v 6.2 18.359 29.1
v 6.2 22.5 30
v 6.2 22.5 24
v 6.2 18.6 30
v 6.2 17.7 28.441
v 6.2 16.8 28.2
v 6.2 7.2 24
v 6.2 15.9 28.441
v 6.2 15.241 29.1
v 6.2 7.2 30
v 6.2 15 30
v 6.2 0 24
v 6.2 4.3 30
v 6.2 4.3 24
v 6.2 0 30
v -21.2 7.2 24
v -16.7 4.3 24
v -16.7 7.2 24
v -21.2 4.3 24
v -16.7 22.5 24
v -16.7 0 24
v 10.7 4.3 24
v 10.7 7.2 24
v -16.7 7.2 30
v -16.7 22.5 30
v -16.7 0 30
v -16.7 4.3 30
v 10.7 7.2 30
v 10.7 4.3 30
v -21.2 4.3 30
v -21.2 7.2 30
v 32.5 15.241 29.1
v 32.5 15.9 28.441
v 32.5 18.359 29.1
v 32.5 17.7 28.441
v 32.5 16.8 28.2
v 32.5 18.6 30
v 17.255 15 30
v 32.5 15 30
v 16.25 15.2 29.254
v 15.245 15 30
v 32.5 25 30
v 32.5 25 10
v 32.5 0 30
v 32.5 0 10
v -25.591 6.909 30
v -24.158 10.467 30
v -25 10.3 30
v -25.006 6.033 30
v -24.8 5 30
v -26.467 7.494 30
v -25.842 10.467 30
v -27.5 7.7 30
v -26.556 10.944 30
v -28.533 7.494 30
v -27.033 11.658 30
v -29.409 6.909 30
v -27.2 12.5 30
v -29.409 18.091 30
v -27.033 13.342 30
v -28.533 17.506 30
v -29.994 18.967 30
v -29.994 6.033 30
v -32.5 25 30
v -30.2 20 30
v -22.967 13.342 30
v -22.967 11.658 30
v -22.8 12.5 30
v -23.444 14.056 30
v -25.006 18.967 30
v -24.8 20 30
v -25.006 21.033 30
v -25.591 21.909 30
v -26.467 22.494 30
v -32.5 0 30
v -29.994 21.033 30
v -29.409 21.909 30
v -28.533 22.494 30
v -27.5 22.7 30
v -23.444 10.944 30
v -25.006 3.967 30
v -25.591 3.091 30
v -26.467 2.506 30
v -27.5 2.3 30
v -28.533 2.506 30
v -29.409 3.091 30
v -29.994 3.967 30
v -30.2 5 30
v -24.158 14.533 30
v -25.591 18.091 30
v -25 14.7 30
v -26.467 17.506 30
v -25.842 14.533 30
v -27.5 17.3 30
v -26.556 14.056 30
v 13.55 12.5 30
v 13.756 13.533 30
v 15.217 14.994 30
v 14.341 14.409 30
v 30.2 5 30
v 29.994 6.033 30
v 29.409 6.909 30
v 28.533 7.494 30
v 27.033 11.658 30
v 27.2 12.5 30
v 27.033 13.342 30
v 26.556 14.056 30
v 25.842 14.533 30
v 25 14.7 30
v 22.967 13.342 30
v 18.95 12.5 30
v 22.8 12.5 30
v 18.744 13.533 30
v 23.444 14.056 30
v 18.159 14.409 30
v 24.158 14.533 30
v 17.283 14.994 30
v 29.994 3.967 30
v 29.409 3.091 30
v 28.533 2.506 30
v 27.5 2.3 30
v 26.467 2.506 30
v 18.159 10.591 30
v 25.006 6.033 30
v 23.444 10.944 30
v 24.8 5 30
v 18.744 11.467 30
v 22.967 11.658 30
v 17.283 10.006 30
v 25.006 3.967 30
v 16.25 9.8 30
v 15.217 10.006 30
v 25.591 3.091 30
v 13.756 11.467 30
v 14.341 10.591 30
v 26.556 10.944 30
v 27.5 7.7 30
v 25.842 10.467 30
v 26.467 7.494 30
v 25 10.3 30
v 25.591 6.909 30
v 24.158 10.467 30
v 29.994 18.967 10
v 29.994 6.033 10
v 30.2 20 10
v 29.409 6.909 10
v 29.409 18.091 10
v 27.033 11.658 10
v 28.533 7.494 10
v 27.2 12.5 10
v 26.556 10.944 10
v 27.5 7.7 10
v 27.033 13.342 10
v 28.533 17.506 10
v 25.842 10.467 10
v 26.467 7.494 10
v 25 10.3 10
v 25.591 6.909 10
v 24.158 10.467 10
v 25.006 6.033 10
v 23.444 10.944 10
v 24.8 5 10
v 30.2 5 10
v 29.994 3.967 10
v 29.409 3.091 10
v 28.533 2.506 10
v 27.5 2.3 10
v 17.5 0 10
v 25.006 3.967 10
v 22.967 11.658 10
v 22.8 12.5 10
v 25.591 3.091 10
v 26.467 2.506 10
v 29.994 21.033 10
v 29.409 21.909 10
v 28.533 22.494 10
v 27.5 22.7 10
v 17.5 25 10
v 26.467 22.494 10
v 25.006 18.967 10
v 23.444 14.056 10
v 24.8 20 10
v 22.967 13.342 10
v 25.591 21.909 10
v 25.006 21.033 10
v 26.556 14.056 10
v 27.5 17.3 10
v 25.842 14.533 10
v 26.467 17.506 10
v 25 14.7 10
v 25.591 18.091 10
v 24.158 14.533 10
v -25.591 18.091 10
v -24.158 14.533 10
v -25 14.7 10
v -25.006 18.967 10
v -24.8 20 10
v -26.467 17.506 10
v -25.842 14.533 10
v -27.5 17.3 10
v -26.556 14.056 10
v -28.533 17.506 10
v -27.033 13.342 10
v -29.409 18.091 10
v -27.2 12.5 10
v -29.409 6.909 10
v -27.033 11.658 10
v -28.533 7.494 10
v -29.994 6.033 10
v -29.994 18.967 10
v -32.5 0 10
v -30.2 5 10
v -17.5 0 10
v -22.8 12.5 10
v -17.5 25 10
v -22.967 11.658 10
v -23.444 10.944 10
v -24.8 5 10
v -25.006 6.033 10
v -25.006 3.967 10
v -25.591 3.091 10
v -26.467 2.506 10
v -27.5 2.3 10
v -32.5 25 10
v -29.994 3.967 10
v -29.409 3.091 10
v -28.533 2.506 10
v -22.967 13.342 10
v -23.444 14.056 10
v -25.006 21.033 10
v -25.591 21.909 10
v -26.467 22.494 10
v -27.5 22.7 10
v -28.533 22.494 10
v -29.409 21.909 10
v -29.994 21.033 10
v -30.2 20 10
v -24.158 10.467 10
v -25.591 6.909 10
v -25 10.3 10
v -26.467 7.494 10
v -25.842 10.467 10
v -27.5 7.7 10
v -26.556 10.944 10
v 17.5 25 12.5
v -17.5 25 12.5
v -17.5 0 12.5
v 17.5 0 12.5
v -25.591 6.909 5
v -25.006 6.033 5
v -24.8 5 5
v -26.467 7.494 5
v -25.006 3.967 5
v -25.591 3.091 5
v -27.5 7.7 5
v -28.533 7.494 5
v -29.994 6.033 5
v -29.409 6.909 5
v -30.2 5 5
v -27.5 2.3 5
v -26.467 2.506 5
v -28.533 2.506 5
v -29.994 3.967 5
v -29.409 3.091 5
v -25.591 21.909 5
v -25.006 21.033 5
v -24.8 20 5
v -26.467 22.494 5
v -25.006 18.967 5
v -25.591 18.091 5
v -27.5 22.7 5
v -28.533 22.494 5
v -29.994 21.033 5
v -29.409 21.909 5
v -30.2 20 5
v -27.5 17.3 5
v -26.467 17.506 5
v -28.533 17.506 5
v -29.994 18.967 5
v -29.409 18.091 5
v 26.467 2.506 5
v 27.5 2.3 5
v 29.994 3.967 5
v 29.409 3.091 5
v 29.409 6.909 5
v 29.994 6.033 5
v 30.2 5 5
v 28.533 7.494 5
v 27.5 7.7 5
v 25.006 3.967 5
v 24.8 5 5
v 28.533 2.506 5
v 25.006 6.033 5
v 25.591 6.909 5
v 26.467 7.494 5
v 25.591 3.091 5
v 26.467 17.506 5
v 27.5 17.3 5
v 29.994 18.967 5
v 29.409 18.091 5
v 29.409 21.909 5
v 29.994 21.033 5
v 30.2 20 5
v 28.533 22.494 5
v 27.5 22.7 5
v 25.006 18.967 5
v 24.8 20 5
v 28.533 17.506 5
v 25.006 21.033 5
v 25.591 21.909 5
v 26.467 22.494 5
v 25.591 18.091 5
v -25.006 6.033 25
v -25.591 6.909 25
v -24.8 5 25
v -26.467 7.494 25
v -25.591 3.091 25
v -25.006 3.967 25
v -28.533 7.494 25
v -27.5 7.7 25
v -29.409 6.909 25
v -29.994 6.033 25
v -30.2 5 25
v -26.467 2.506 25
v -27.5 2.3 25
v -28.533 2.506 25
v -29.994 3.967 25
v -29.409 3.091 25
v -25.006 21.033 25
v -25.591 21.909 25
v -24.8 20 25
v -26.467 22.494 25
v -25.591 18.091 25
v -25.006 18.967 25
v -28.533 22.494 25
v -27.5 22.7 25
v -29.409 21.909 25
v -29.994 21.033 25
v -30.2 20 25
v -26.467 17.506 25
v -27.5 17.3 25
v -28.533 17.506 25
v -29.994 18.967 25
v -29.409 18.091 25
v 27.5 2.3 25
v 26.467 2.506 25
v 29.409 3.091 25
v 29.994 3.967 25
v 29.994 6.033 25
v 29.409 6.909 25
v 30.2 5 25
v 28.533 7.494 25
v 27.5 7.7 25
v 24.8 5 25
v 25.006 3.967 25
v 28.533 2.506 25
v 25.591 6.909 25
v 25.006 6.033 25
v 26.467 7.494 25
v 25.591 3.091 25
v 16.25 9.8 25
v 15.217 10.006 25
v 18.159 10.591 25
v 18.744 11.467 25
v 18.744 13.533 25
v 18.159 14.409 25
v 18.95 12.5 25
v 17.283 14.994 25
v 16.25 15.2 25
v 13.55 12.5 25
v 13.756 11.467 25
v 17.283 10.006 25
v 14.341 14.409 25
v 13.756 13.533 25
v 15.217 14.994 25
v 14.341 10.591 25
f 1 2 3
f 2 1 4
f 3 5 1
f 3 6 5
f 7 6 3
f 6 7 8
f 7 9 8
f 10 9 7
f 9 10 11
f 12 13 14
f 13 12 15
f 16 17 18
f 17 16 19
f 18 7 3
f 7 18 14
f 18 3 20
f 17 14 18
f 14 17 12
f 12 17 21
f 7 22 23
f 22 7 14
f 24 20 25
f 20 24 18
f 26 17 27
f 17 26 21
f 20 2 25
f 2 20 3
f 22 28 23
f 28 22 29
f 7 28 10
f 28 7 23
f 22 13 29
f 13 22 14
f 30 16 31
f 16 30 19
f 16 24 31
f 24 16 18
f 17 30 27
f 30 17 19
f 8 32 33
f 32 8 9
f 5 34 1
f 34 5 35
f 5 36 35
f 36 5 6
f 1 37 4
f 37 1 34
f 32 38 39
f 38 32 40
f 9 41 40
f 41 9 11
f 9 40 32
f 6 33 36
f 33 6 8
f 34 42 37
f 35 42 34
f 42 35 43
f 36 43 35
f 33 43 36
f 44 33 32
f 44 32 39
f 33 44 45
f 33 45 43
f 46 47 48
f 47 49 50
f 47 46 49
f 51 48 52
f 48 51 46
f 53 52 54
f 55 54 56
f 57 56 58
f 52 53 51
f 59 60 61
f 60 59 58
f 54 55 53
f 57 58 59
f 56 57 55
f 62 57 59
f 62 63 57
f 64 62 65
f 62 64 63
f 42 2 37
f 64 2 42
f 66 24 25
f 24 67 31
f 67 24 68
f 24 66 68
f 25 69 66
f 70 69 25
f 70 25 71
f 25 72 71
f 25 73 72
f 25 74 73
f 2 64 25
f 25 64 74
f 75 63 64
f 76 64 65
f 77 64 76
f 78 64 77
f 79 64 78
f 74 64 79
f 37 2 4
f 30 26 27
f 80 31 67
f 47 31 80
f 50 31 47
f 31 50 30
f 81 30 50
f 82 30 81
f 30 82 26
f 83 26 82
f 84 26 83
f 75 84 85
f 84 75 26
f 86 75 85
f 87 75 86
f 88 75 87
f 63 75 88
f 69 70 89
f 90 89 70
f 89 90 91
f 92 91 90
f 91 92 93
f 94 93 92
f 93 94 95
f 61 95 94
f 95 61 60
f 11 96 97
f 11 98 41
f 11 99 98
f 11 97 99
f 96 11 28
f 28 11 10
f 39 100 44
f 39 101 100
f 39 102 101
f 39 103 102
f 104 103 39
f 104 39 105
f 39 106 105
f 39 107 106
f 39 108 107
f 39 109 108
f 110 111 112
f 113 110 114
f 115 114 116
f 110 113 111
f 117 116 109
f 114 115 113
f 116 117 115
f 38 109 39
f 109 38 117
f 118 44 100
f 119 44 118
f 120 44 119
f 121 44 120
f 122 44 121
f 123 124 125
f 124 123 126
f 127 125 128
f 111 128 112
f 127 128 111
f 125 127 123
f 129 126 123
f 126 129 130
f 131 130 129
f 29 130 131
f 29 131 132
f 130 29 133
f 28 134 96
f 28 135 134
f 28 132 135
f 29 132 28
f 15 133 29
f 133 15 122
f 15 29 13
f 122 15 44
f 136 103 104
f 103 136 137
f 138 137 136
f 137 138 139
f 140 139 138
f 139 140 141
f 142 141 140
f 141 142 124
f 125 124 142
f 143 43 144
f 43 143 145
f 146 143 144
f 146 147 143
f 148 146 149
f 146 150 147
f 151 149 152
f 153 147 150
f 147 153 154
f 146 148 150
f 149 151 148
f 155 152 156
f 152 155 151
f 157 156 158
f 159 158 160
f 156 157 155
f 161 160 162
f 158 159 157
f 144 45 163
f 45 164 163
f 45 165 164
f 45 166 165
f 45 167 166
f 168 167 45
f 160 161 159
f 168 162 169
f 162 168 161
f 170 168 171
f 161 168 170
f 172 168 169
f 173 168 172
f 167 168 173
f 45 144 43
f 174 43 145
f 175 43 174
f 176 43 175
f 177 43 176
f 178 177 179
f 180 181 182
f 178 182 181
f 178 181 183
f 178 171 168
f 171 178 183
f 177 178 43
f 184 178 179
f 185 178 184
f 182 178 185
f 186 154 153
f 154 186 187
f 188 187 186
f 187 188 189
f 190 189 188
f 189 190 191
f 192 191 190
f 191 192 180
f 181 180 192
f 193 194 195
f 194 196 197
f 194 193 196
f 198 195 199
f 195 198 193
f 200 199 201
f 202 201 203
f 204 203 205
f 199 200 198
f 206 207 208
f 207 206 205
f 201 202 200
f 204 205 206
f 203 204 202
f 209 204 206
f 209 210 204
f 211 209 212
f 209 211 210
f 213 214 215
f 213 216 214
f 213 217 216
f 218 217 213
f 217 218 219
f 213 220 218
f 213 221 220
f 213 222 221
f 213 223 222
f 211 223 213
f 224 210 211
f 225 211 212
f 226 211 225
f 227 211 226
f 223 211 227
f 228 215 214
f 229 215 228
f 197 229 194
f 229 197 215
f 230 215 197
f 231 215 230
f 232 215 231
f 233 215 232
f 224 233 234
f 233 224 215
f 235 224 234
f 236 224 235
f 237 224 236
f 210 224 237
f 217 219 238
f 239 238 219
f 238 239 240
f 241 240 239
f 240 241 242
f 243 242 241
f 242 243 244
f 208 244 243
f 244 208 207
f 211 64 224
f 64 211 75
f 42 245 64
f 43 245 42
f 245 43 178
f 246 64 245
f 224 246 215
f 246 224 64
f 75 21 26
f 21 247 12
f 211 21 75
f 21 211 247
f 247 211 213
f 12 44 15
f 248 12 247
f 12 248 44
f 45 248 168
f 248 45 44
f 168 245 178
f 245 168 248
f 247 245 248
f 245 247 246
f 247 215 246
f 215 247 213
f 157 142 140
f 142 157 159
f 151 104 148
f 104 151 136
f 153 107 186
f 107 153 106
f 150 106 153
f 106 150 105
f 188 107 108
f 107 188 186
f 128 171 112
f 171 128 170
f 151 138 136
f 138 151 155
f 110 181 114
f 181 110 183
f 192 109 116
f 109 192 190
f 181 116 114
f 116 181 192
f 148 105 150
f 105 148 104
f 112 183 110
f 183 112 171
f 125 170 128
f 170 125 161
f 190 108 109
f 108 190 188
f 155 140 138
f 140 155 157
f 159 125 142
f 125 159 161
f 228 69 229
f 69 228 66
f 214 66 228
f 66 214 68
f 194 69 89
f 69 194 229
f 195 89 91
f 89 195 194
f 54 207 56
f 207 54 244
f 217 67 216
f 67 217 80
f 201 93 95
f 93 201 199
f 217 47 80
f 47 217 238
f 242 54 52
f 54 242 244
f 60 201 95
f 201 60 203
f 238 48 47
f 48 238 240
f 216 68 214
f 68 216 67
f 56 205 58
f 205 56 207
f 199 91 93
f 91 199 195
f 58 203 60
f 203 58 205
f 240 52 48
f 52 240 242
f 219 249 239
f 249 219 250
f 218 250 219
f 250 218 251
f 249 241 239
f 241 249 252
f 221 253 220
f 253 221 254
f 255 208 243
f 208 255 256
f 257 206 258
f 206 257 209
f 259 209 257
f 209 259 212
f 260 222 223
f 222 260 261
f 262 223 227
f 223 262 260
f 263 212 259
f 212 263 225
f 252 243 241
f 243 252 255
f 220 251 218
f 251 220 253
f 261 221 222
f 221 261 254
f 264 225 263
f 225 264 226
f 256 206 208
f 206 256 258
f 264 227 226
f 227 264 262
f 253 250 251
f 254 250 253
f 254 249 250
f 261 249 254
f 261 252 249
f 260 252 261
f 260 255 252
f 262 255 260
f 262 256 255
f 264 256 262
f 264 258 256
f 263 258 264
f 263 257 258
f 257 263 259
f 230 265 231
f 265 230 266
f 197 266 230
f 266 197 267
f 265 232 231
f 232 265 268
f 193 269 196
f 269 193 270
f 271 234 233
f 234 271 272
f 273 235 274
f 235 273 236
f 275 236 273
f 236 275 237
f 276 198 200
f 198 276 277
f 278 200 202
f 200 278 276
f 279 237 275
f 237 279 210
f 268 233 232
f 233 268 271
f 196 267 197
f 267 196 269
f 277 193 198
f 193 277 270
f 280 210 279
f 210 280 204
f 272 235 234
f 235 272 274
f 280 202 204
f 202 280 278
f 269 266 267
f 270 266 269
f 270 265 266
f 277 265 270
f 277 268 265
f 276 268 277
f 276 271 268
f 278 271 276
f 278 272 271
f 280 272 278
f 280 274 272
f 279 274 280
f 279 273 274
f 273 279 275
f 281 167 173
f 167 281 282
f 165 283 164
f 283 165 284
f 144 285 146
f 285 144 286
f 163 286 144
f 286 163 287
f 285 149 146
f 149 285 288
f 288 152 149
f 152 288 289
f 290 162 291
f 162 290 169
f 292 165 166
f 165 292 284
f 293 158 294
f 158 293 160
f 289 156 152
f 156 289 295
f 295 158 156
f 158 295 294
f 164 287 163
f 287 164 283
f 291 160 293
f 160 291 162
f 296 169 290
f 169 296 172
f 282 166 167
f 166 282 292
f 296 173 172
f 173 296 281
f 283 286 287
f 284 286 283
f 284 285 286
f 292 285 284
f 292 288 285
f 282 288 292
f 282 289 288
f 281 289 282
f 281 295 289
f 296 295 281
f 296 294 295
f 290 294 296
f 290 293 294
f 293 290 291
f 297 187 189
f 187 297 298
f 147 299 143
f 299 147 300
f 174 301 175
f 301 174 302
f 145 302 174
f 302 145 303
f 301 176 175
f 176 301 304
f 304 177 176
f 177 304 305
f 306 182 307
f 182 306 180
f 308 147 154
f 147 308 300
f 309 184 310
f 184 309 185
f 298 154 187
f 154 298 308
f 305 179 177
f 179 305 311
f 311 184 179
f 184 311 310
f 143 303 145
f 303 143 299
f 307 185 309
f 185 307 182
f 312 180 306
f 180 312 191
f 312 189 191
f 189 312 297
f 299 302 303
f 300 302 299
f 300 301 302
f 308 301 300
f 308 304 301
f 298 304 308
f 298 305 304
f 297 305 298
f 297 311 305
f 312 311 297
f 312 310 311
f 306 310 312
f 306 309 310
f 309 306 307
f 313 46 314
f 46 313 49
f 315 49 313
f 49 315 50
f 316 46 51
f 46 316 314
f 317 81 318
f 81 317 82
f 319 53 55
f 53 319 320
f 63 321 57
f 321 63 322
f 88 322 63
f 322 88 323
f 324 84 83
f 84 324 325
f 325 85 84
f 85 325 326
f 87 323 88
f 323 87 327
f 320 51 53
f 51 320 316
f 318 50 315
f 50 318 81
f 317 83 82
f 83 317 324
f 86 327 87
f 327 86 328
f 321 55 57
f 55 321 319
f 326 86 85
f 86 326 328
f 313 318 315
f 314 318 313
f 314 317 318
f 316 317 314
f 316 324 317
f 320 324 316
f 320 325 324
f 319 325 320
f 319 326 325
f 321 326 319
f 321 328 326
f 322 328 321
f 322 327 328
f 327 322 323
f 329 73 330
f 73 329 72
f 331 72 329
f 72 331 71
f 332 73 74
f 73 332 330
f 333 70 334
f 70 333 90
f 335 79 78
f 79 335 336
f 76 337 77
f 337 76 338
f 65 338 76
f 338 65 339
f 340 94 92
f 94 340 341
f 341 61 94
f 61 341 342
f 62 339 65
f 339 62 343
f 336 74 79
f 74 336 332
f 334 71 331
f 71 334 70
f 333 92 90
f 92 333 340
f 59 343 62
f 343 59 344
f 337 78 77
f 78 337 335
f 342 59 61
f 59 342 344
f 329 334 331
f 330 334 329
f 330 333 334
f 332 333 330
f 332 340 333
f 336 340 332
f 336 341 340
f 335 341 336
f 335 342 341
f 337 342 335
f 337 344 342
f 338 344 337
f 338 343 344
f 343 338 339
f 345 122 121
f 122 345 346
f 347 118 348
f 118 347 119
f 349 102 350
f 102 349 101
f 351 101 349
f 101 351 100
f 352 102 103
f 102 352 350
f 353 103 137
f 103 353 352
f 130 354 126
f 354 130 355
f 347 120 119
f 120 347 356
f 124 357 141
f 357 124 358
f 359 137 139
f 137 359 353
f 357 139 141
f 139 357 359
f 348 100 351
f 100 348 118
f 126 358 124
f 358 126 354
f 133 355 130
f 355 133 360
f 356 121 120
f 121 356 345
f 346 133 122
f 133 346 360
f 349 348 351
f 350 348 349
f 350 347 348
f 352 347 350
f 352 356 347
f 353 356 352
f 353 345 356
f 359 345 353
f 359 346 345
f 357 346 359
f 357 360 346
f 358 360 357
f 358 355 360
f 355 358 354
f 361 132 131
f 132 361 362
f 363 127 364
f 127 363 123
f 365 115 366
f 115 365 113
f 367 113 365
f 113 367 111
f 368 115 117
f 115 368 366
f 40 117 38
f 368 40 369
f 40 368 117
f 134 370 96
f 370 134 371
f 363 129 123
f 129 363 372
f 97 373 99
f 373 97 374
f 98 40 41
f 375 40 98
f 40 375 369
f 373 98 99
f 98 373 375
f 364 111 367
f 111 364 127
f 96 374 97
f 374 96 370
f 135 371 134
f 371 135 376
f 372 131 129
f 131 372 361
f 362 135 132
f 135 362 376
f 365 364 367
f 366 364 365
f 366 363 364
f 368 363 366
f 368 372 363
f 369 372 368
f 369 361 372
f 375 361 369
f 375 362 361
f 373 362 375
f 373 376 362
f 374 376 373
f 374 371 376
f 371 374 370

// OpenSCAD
// file: servo.scad
    box_width=22.5;
    box_depth=23.3;
    box_height=12;
    cylinder_depth=6;
    small_cylinder=3;
    cylinders_width=15;
    gear_radius=2.5;
    gear_height=3;
    fixation_depth=2.5;
    fixation_width=4.5;
    fixation_depth_position=5.5;
    vis_hole=1;
    screw_radius=0.5;
    screw_long=10;
    cable_radius=1.6;
    cable_depth=5.5;


    wheel_depth=8;
    wheel_height=6;
    wheel_radius=30;
    wheel_depth_int=4;
    wheel_gear=2;


function wheelRadius() = wheel_radius;


module servo(with_screw=false,with_cable=false,with_screw_hole=true,security=0) {        
    //big cylinder
    translate([box_width-box_height/2,0,box_height/2]){
        rotate([90,0,0]){
            #cylinder(cylinder_depth,d=box_height+2*security);
        }
    }
    //gear
    translate([box_width-box_height/2,-cylinder_depth,box_height/2]){
        rotate([90,0,0]){
            cylinder(gear_height,gear_radius,gear_radius);
        }
    }
    //small cylinder
    translate([box_width-(cylinders_width-small_cylinder),0,box_height/2]){
        rotate([90,0,0]){
            cylinder(cylinder_depth,d=small_cylinder+2*security,$fn=16);
        }
    }
    //box
    translate([-security,-security,0]) cube([box_width+2*security,box_depth+2*security,box_height+security]);
    
    //fixation droite
    translate([box_width,fixation_depth_position,0]){
        difference() {
            translate([-security,-security,0]) cube([fixation_width+2*security,fixation_depth+2*security,box_height+security]);
            if (with_screw_hole) {
                translate([fixation_width/2,fixation_depth,box_height/2]){
                    rotate([90,0,0]){
                        cylinder(fixation_depth,d=2*(vis_hole+security),$fn=12);
                    }
                }
            }
        }
        if (with_screw) {
            translate([fixation_width/2,screw_long,box_height/2]){
                rotate([90,0,0]){
                    #cylinder(screw_long,screw_radius,screw_radius,$fn=12);
                }
            }
        }
    }
    //fixation gauche
    translate([-fixation_width,fixation_depth_position,0]){
        difference() {
            translate([-security,-security,0]) cube([fixation_width+2*security,fixation_depth+2*security,box_height+security]);
            if (with_screw_hole) {
                translate([fixation_width/2,fixation_depth,box_height/2]){
                    rotate([90,0,0]){
                        cylinder(fixation_depth,d=2*(vis_hole+security),$fn=12);
                    }
                }
            }
        }
        if (with_screw) {
            translate([fixation_width/2,screw_long,box_height/2]){
                rotate([90,0,0]){
                    #cylinder(screw_long,screw_radius,screw_radius,$fn=12);
                }
            }
        }
    }
    if (with_cable) {
        translate([box_width,box_depth-cable_depth,box_height/2]){
            rotate([90,0,90]){
                cylinder(40,d=2*(cable_radius+security),$fn=12);
            }
        }
    }
}

module wheel() {    
    translate([0,0,wheel_radius]){
        rotate([90,0,0]){
            difference() {
                cylinder(wheel_depth,wheel_radius,wheel_radius);
                cylinder(wheel_depth,wheel_radius-wheel_height,wheel_radius-wheel_height);
            }
            translate([0,0,(wheel_depth-wheel_depth_int)/2]){
                cylinder(wheel_depth_int,wheel_radius-wheel_height,wheel_radius-wheel_height);
            }
        }
    }
}


module servo_wheel(with_screw=false,with_cable=false,with_screw_hole=true,security=0) {
    translate([0,-cylinder_depth,]){
        translate([-(box_width-box_height/2), (cylinder_depth+gear_height)-(wheel_depth-wheel_depth_int)/2-wheel_gear,wheel_radius-box_height/2]){
            servo(with_screw,with_cable,with_screw_hole,security=security);
        }

        wheel();
    }
}

servo_wheel(true,true,security=0.2);
// main file
use <servo.scad>

support_width=65;
support_deep=25;
screw=4;

function supportWidth() = support_width;
function supportDeep() =support_deep;

module support_servo_bas(chassis_height=10,security=0,mask_security=0,with_screw=false) {
    support_height=wheelRadius()-chassis_height;
    difference() {
        union() {
            difference() {
                translate([-support_width/2,0,chassis_height]) cube([support_width,support_deep,support_height]);
                #translate([-support_width/2+15,0,chassis_height]) cube([support_width-30,support_deep,2.5]);
                #servo_wheel(false,true, false,security=security);
                
                translate([support_width/2-7.5,support_deep/2,0]) cylinder(100,d=screw+2*security,$fn=16);
                translate([-support_width/2+7.5,support_deep/2,0]) cylinder(100,d=screw+2*security,$fn=16);
            }
            translate([-support_width/2+5,5,chassis_height-5]) cylinder(5,d=5+2*mask_security,$fn=16);
            translate([-support_width/2+5,support_deep-5,chassis_height-5]) cylinder(5,d=5+2*mask_security,$fn=16);
            translate([support_width/2-5,5,chassis_height-5]) cylinder(5,d=5+2*mask_security,$fn=16);
            translate([support_width/2-5,support_deep-5,chassis_height-5]) cylinder(5,d=5+2*mask_security,$fn=16);
            if (with_screw) {
                translate([support_width/2-7.5,support_deep/2,0]) cylinder(50,d=screw+2*mask_security,$fn=16);
                translate([-support_width/2+7.5,support_deep/2,0]) cylinder(50,d=screw+2*mask_security,$fn=16);
            }
        }
        support_servo_haut(security,0.2);
    } 
}

module support_servo_haut(security=0,mask_security=0) {
    support_height=10;
    level=wheelRadius();
    difference() {
        translate([-support_width/2,0,level]) cube([support_width,support_deep,support_height]);
        #servo_wheel(false,true, false,security=security);
        
        translate([support_width/2-7.5,support_deep/2,0]) cylinder(100,d=screw+2*security,$fn=16);
        translate([-support_width/2+7.5,support_deep/2,0]) cylinder(100,d=screw+2*security,$fn=16);
    }
    translate([-support_width/2+5,5,level-5]) cylinder(5,d=5+2*mask_security,$fn=16);
    translate([-support_width/2+5,support_deep-5,level-5]) cylinder(5,d=5+2*mask_security,$fn=16);
    translate([support_width/2-5,5,level-5]) cylinder(5,d=5+2*mask_security,$fn=16);
    #translate([support_width/4,support_deep/2,level-5]) cylinder(5,d=5+2*mask_security,$fn=16);
}

!support_servo_bas(security=0.2,mask_security=0.2,with_screw=false);
support_servo_haut();
